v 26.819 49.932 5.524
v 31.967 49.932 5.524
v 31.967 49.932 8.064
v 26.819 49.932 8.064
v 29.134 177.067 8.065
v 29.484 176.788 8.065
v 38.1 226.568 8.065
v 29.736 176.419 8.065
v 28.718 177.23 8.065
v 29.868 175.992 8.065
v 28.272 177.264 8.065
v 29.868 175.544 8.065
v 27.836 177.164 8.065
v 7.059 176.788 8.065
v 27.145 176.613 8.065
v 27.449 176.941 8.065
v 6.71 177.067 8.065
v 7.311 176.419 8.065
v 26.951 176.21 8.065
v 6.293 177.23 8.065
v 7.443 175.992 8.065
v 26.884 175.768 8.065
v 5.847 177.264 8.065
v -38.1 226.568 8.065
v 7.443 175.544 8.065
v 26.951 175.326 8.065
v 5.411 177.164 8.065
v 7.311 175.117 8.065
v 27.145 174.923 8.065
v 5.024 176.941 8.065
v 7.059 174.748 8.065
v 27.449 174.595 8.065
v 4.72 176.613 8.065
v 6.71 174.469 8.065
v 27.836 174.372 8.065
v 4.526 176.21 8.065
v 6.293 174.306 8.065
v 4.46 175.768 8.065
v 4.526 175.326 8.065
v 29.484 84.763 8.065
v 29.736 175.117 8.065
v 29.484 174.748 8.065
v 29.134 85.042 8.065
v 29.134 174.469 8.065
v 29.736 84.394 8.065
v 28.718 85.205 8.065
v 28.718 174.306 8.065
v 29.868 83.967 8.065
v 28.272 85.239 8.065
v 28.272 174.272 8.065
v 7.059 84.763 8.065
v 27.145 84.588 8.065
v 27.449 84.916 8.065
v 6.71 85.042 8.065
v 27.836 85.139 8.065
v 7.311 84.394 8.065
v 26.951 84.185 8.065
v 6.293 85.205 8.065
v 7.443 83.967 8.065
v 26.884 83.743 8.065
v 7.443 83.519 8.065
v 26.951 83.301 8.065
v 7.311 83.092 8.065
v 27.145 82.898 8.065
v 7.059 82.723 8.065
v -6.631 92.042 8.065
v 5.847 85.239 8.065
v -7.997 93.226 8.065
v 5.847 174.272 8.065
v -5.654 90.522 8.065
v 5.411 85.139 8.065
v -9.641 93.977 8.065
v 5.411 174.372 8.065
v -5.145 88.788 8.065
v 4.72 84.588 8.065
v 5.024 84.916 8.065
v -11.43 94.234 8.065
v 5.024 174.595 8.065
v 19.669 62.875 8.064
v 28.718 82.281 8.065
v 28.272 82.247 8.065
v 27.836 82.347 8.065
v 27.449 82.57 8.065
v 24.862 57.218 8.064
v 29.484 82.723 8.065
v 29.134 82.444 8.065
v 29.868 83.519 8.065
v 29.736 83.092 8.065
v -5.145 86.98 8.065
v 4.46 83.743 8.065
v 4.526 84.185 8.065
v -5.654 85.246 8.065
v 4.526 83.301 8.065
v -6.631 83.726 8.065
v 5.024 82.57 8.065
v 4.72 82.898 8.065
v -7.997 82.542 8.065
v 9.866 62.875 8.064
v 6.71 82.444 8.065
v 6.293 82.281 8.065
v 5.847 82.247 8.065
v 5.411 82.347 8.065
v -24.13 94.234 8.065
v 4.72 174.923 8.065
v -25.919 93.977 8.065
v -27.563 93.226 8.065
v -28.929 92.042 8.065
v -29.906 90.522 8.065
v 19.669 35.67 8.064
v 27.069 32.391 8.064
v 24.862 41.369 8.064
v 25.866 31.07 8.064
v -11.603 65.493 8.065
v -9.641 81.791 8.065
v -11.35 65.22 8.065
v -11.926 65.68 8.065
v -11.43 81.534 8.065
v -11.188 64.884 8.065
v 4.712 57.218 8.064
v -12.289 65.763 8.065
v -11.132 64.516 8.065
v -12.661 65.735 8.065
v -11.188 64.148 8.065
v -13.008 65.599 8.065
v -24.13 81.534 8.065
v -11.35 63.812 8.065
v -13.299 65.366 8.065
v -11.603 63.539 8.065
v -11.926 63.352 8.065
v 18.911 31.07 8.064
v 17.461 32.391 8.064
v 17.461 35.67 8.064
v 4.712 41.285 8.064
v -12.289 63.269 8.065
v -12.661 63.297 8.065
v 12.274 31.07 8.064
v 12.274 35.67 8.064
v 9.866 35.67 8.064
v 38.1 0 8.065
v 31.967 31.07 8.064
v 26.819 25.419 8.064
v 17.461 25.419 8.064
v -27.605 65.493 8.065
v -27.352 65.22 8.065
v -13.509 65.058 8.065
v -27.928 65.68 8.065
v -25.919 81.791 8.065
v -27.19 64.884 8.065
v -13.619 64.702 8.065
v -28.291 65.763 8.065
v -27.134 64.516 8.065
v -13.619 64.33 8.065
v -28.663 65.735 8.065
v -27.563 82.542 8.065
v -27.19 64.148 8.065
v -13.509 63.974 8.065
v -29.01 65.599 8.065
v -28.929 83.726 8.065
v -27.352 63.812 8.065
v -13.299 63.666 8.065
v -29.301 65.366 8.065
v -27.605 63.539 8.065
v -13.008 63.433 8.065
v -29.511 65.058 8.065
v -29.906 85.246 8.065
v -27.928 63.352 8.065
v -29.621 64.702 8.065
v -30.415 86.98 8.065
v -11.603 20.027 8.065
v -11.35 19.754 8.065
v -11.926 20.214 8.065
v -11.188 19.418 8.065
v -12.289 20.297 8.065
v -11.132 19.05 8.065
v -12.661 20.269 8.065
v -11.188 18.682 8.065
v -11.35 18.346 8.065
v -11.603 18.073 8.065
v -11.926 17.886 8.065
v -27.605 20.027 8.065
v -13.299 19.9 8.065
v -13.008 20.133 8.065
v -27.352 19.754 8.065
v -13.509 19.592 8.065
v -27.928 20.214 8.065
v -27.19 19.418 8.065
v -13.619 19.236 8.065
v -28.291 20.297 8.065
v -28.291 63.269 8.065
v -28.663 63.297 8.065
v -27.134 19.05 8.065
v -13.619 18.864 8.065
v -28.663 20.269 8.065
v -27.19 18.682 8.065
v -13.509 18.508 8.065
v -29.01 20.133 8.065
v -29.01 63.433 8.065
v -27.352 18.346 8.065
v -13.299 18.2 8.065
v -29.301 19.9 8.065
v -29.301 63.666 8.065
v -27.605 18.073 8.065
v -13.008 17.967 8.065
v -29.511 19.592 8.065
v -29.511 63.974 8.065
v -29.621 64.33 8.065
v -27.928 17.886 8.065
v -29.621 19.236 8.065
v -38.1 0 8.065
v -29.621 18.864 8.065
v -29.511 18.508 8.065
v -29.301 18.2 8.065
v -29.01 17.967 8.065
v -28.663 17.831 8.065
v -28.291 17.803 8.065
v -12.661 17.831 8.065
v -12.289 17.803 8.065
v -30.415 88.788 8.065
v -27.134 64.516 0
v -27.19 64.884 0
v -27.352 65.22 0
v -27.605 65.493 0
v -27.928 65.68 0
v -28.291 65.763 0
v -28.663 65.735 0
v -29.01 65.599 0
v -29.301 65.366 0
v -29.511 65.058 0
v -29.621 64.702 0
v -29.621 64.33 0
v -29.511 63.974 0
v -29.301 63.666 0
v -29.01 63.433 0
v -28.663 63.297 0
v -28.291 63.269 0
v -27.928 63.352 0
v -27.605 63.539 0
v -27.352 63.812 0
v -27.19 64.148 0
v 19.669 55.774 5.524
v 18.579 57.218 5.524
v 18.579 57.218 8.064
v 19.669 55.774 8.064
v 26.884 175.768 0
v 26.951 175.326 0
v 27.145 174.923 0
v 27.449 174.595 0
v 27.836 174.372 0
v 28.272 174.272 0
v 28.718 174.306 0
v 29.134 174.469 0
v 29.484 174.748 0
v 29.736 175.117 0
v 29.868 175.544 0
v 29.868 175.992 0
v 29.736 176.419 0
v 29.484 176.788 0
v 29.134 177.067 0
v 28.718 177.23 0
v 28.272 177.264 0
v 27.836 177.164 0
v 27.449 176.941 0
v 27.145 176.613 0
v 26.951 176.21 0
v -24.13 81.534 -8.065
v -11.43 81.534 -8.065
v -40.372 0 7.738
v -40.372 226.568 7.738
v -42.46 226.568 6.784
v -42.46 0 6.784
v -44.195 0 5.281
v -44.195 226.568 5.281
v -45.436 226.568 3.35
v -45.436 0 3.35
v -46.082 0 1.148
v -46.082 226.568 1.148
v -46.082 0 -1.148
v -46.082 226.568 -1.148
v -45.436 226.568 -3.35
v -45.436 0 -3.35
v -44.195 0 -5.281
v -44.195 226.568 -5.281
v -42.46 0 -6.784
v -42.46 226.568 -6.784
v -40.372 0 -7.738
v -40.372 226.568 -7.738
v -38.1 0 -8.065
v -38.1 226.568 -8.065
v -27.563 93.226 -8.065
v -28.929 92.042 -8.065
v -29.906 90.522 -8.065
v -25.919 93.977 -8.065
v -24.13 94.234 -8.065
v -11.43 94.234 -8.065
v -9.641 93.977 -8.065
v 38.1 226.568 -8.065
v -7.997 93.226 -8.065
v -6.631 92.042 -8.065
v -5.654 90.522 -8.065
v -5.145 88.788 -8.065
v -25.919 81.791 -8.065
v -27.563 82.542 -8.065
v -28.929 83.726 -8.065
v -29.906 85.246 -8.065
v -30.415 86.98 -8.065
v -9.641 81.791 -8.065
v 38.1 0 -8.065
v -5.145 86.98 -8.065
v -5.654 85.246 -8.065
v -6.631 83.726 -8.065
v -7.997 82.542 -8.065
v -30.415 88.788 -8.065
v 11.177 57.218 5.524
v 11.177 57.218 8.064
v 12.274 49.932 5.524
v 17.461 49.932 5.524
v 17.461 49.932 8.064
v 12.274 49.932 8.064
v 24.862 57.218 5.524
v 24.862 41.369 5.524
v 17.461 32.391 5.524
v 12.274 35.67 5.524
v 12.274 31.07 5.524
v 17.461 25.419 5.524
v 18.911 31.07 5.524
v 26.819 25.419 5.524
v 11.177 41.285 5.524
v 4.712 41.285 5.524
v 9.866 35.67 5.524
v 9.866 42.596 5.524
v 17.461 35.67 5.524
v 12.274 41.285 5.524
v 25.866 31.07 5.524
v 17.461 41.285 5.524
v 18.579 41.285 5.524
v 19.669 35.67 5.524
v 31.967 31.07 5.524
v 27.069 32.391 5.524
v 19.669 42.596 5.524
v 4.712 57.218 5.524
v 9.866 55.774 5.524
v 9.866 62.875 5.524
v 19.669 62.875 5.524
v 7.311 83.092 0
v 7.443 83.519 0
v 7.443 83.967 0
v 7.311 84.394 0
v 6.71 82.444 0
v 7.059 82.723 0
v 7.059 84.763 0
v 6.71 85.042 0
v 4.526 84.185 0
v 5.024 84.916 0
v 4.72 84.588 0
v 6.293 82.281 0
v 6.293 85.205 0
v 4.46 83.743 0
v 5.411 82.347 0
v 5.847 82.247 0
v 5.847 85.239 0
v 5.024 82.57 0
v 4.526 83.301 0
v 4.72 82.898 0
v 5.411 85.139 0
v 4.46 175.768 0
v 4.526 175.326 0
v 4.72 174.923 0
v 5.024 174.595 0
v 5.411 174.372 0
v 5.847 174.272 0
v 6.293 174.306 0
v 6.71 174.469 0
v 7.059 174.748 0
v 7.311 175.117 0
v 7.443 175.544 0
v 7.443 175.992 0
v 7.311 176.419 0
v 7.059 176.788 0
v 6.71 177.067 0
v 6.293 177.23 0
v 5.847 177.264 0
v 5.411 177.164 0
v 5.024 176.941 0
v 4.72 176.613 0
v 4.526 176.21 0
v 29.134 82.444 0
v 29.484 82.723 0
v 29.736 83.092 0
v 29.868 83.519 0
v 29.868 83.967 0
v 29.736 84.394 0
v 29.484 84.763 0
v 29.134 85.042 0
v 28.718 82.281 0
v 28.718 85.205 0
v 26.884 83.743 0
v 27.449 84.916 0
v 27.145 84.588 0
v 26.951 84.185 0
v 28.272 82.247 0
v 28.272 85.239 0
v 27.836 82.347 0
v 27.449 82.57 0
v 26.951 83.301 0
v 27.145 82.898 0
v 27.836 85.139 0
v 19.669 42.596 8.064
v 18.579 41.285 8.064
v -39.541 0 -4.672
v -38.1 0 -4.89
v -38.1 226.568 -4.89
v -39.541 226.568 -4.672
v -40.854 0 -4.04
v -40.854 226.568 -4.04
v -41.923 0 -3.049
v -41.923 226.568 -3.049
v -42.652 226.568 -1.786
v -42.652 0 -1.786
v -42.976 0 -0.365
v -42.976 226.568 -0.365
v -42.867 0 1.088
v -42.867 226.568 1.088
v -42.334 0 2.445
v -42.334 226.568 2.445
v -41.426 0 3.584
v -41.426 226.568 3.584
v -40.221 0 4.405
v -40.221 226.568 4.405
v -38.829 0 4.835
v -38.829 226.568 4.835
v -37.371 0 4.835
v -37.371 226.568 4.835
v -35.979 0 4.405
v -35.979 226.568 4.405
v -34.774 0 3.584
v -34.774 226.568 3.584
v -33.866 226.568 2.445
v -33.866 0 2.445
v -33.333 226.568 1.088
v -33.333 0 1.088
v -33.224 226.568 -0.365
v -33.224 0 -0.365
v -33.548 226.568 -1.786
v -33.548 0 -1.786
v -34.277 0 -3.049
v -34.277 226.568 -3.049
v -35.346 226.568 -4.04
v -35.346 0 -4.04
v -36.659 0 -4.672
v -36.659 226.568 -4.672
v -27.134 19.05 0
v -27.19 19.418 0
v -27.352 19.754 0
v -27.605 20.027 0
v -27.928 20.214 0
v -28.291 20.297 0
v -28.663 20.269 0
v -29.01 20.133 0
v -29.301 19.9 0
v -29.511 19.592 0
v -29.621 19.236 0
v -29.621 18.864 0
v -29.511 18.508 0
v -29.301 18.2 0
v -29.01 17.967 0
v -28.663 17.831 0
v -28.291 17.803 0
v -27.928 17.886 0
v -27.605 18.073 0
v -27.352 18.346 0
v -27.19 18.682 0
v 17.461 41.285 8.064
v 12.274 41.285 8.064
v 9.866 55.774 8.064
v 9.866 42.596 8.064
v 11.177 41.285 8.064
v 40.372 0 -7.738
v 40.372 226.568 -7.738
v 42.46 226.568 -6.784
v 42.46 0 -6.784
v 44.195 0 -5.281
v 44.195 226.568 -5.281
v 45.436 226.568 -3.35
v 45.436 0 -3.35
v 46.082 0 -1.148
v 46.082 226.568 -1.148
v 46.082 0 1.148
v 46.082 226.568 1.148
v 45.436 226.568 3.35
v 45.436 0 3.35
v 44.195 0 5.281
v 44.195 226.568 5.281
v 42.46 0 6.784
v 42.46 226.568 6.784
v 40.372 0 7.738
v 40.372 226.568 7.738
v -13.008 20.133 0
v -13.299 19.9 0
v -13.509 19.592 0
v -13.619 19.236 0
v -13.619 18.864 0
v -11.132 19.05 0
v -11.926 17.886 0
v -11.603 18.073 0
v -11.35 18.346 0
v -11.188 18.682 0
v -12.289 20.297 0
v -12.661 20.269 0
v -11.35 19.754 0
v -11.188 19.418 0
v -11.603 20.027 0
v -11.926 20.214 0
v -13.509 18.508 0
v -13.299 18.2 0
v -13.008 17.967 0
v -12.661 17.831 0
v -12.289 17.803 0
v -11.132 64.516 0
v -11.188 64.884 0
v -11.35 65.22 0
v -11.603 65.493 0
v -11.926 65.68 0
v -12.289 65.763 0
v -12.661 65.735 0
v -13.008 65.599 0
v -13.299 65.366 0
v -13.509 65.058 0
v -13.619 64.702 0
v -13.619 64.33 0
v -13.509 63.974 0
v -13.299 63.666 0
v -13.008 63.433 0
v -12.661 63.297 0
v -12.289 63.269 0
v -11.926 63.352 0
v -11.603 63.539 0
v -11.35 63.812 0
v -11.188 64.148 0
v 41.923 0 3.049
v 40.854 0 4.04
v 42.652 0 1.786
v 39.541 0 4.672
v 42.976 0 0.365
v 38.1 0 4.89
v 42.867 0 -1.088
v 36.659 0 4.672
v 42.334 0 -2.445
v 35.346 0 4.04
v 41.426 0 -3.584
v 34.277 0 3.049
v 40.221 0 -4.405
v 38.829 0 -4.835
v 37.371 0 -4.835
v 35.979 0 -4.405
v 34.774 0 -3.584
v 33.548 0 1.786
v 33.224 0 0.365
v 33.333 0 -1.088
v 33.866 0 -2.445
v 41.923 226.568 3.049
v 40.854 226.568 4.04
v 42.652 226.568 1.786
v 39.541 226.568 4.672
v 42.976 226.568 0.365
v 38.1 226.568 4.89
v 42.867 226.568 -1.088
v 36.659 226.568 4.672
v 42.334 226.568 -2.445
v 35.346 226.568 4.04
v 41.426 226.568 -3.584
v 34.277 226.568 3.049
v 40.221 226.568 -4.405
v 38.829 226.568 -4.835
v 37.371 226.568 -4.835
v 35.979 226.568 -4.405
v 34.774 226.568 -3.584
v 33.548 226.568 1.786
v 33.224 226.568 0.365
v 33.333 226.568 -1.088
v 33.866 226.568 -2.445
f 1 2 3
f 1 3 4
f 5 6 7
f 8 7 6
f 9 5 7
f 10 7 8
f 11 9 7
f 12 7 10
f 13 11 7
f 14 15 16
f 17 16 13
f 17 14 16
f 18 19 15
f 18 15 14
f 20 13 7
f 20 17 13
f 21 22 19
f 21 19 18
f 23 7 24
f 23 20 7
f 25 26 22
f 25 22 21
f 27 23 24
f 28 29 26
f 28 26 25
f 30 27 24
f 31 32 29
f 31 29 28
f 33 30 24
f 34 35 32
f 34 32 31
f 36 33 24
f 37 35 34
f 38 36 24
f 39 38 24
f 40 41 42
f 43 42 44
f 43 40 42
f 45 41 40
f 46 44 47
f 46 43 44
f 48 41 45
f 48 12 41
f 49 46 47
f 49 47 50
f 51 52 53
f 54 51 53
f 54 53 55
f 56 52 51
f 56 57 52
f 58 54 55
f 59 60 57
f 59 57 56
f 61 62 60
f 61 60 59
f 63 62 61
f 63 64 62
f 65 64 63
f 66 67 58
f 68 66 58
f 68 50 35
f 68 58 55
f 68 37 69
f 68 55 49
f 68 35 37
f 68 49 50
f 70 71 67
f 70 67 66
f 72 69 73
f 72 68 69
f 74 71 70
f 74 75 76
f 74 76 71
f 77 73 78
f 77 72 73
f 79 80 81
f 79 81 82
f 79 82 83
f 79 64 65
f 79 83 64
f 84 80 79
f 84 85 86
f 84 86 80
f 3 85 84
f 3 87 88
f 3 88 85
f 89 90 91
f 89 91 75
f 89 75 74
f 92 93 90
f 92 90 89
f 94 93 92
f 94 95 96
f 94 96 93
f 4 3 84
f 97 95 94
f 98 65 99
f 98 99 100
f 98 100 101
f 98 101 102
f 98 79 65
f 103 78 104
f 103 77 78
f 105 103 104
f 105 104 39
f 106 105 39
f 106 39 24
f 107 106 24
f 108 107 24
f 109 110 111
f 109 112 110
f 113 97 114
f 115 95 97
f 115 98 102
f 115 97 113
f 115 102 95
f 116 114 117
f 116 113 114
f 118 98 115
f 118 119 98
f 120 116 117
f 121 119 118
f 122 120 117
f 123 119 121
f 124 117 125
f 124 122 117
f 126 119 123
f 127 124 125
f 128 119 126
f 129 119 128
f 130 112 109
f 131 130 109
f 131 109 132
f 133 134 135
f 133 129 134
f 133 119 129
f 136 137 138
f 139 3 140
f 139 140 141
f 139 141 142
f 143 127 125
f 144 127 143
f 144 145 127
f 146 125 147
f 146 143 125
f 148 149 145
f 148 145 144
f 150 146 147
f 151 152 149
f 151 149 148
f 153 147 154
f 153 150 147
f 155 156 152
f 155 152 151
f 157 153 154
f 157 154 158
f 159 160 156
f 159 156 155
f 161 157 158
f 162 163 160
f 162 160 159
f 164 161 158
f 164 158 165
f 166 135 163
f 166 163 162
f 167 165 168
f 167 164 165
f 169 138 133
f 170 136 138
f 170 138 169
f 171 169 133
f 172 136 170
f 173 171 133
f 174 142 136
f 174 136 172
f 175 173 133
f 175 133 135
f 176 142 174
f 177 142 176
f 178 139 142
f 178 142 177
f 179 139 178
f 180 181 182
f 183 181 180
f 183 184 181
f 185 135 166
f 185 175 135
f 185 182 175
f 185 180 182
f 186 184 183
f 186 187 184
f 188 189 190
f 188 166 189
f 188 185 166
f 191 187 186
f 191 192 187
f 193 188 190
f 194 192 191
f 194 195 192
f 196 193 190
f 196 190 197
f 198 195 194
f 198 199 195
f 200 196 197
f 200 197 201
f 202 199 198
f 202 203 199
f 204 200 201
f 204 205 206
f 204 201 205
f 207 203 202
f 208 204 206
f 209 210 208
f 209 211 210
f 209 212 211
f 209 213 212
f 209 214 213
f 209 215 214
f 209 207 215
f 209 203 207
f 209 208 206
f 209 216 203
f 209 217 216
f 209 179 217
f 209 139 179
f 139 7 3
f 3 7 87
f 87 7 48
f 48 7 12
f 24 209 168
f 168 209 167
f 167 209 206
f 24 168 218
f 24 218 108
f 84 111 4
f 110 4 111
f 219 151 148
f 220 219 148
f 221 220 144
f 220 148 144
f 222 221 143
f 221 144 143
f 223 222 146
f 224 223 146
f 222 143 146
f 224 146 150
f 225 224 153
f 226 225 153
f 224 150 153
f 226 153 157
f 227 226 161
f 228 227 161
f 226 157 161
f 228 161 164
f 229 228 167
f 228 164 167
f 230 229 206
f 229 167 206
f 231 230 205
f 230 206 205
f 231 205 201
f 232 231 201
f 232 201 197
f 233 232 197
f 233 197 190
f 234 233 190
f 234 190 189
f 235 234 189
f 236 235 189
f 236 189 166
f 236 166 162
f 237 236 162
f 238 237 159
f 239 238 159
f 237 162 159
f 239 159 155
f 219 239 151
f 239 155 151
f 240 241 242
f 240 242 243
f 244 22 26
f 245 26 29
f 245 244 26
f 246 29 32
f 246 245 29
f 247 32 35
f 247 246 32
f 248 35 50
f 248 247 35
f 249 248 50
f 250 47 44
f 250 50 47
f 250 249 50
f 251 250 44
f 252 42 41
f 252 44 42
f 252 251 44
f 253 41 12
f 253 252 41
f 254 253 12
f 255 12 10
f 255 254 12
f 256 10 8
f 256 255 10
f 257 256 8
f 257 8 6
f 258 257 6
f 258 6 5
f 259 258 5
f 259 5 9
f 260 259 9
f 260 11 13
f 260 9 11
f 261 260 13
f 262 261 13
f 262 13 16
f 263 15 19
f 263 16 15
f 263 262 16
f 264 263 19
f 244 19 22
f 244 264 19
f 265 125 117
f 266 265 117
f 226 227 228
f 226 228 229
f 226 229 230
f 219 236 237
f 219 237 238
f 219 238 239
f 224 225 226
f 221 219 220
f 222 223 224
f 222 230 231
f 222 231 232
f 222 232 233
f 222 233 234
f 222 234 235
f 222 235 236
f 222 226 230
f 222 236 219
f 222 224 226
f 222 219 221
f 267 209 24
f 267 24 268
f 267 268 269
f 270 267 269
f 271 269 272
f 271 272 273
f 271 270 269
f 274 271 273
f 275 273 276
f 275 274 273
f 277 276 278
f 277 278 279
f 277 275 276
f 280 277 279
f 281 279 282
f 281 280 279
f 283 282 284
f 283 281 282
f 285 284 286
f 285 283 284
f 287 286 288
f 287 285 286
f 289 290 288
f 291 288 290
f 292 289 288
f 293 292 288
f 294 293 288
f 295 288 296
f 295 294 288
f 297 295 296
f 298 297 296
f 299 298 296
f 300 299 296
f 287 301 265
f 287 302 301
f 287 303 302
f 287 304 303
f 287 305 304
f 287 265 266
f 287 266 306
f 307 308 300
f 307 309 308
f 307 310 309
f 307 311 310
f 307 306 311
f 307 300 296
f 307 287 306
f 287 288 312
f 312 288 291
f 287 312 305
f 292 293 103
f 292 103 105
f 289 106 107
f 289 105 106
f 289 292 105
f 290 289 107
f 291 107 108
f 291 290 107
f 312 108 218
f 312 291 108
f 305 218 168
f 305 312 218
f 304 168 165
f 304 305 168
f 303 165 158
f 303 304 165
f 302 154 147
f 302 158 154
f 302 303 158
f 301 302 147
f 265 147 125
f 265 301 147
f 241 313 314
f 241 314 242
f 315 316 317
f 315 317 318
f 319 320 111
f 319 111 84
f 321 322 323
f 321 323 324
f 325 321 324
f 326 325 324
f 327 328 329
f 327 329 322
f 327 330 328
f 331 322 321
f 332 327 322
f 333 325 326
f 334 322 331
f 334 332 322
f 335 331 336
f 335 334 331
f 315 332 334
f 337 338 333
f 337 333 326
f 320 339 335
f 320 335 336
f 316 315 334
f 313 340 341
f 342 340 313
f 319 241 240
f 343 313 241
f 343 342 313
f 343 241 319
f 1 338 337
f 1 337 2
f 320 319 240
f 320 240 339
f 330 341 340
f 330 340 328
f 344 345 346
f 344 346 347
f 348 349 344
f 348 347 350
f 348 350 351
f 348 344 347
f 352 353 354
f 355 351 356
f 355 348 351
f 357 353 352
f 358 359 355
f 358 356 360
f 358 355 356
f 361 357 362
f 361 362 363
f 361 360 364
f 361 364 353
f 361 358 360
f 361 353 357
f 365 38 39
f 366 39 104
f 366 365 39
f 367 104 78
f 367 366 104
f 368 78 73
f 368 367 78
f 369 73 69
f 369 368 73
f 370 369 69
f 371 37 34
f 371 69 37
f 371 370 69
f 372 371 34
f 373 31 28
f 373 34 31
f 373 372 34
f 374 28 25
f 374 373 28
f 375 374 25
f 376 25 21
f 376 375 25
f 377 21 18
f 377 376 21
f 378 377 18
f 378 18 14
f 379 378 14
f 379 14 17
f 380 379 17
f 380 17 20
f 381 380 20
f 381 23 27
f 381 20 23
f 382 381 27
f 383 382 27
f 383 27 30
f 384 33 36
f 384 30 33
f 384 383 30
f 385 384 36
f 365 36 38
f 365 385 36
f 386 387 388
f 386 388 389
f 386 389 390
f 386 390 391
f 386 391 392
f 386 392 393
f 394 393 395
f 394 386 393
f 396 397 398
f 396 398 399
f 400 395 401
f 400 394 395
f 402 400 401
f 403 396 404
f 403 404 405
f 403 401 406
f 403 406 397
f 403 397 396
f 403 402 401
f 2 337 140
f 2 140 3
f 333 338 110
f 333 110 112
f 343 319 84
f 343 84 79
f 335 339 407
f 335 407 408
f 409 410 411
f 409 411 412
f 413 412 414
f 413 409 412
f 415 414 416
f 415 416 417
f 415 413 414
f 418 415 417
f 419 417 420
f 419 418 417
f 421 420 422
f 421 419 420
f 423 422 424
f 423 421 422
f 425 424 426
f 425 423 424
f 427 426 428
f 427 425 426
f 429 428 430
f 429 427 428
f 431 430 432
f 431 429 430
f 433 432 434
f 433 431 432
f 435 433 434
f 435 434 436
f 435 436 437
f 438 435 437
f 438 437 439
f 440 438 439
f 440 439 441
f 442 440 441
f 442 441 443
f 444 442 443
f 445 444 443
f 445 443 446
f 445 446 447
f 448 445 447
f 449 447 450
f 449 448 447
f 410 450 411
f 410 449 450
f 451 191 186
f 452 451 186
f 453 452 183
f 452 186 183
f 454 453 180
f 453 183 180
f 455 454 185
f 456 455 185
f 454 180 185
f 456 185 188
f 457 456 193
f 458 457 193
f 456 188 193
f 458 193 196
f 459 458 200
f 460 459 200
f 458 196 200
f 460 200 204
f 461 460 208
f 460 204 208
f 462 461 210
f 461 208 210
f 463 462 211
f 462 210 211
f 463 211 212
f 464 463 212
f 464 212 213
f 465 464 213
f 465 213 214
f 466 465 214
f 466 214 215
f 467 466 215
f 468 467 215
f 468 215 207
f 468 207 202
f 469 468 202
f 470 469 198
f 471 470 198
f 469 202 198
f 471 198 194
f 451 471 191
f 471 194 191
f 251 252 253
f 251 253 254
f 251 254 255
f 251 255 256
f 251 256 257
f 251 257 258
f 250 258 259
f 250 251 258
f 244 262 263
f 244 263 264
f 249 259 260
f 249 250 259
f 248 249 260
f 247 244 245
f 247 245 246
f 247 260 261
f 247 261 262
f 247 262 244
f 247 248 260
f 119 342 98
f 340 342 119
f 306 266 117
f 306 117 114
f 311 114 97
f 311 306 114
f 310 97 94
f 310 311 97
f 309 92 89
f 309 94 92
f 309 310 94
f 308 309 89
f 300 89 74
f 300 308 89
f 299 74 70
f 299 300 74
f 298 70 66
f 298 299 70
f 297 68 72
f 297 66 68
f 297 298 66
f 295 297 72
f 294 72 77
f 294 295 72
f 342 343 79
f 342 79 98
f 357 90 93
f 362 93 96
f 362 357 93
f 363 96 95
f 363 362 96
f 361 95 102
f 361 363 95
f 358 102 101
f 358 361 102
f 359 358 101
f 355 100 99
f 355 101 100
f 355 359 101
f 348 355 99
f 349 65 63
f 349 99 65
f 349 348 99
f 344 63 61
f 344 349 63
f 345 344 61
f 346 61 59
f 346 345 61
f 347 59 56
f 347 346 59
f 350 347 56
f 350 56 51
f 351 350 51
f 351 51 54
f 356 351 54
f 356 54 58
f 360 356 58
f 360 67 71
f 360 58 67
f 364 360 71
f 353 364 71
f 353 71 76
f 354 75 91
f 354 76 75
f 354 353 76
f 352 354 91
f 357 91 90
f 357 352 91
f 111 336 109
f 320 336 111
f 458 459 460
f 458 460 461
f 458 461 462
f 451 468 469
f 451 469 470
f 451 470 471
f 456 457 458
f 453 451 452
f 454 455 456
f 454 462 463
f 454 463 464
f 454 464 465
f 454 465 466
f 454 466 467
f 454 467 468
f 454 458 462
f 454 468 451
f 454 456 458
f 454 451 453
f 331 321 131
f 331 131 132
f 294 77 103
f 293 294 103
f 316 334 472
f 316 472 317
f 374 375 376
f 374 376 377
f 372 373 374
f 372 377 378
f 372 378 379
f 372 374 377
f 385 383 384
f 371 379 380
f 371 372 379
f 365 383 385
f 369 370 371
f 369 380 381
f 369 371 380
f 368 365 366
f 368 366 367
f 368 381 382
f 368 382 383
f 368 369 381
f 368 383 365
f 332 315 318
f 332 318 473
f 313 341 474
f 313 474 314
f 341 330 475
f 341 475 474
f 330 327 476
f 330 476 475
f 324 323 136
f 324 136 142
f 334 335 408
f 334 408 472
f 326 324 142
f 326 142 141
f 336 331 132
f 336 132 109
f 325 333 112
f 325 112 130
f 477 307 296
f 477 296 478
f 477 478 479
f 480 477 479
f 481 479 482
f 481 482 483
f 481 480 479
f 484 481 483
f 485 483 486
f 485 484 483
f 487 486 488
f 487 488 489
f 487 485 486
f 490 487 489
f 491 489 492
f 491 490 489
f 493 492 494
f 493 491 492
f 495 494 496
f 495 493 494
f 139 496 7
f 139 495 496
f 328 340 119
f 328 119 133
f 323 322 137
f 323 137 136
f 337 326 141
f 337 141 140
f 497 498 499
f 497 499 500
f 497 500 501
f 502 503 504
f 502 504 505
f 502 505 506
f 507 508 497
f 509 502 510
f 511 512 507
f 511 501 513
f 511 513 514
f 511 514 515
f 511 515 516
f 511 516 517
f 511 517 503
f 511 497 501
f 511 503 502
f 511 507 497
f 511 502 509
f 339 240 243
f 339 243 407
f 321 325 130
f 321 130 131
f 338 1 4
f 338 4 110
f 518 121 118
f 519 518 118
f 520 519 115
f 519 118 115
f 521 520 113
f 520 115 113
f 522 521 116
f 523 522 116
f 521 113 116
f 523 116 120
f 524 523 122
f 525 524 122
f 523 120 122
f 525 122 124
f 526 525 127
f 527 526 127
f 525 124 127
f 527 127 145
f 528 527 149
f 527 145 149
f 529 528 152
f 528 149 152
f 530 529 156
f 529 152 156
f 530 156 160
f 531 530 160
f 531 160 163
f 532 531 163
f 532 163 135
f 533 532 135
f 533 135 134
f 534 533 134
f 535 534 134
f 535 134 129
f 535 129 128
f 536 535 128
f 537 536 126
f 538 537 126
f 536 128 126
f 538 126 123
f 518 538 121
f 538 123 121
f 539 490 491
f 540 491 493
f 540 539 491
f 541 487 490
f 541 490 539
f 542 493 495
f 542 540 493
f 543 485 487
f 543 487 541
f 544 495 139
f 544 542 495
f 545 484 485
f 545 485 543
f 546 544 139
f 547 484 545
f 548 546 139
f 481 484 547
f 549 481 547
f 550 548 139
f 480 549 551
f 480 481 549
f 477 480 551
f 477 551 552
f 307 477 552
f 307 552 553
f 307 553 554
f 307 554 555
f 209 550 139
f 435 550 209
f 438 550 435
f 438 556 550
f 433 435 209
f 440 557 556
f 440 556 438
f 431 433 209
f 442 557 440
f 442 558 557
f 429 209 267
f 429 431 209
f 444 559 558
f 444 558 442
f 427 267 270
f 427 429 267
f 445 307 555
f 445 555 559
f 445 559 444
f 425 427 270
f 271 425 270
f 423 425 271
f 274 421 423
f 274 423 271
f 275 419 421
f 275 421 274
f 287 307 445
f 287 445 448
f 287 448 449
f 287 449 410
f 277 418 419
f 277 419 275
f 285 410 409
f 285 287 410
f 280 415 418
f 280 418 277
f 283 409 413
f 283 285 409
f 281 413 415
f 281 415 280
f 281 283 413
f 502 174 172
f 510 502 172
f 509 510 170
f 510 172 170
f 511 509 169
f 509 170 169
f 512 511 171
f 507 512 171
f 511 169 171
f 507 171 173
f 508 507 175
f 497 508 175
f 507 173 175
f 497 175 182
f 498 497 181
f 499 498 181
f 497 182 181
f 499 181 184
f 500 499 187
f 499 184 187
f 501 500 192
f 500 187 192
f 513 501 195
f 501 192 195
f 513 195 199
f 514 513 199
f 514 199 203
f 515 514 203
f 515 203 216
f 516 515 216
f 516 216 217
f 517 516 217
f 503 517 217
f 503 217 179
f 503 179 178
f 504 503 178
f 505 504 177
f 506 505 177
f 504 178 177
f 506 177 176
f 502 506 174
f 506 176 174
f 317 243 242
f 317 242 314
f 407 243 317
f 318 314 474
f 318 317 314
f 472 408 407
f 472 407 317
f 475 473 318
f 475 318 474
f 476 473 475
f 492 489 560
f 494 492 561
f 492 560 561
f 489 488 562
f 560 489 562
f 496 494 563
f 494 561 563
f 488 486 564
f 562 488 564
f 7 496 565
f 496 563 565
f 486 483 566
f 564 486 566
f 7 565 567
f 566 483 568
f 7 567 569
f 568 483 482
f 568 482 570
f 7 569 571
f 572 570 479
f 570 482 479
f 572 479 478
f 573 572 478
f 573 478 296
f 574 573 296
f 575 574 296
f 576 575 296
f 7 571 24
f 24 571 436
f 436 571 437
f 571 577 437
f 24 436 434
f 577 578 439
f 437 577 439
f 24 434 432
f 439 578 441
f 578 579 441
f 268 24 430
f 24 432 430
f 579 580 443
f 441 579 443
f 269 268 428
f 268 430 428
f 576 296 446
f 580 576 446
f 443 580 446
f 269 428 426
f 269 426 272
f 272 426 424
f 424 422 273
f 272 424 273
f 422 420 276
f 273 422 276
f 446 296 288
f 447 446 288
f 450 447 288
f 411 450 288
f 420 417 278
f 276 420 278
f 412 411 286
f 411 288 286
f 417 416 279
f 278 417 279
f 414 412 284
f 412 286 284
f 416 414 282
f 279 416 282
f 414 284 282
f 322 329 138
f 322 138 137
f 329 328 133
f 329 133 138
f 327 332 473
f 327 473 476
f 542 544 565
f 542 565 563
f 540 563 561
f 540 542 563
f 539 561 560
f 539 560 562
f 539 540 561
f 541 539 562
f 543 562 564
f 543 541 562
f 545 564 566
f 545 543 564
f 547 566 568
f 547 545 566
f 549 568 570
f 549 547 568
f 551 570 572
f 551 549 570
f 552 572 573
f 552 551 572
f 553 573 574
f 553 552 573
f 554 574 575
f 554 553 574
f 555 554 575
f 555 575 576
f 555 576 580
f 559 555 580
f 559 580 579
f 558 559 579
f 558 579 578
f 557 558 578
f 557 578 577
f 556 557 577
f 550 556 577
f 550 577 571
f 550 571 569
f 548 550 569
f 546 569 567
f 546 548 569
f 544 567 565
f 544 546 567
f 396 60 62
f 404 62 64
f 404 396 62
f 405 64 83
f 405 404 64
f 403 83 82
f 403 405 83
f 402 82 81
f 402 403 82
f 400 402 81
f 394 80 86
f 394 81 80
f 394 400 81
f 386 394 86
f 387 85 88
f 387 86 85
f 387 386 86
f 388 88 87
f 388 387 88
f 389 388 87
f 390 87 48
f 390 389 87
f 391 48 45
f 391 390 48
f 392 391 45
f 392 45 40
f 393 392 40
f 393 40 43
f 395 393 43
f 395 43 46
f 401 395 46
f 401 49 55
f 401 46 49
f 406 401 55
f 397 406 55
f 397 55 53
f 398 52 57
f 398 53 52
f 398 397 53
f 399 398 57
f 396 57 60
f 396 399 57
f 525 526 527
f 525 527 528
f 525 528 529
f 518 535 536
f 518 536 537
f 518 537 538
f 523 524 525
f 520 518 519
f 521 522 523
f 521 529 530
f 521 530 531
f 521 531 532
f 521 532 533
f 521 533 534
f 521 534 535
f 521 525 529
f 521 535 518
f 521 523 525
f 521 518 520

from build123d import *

# Parameters (mm, degrees)
SKETCH1_R               = 4.8895
BOSS_EXTRUDE1_DEPTH     = 226.568
CUT_EXTRUDE2_DEPTH      = 232.785168476
CUT_EXTRUDE2_DEPTH_BACK = 232.785168476
CUT_EXTRUDE3_START      = 5.5245
CUT_EXTRUDE3_DEPTH      = 2.54
CUT_EXTRUDE4_DEPTH      = 232.785168476
CUT_EXTRUDE4_DEPTH_BACK = 8.0645
SKETCH6_R               = 1.5
SKETCH7_R               = 1.25
CUT_EXTRUDE5_DEPTH      = 8.0645


# Read off the part's stored shape, not the designer's step: Cut-Extrude3
with BuildPart() as part:
    # Sketch1 → Boss-Extrude1 (new body)
    with BuildSketch(Plane(origin=(0, 0, 0), x_dir=(1, 0, 0), z_dir=(0, 1, 0))):
        with BuildLine():
            Line((-38.1, 8.0645), (38.1, 8.0645))
            ThreePointArc((38.1, 8.0645), (46.1645, 0), (38.1, -8.0645))
            Line((38.1, -8.0645), (-38.1, -8.0645))
            ThreePointArc((-38.1, -8.0645), (-46.1645, 0), (-38.1, 8.0645))
        make_face()
        with Locations(Location((38.1, 0, 0), (0, 0, 270))):
            Circle(SKETCH1_R, mode=Mode.SUBTRACT)
        with Locations(Location((-38.1, 0, 0), (0, 0, 90))):
            Circle(SKETCH1_R, mode=Mode.SUBTRACT)
    extrude(amount=BOSS_EXTRUDE1_DEPTH)

    # Sketch2 → Cut-Extrude2 (cut, two sides: drawn at the far end of the back side and taken through both)
    with BuildSketch(Plane.XY.offset(8.0645).offset(-CUT_EXTRUDE2_DEPTH_BACK)):
        with BuildLine():
            Line((-24.13, 81.534), (-11.43, 81.534))
            ThreePointArc((-11.43, 81.534), (-5.08, 87.884), (-11.43, 94.234))
            Line((-11.43, 94.234), (-24.13, 94.234))
            ThreePointArc((-24.13, 94.234), (-30.48, 87.884), (-24.13, 81.534))
        make_face()
    extrude(amount=CUT_EXTRUDE2_DEPTH + CUT_EXTRUDE2_DEPTH_BACK, mode=Mode.SUBTRACT)

    # Cut-Extrude3 outline → Cut-Extrude3 (cut)
    with BuildSketch(Plane.XY.offset(CUT_EXTRUDE3_START)):
        Polygon((4.712362594, 41.284608988), (9.865946199, 35.669510433), (12.274110435, 35.669510433), (12.274110435, 31.069950753), (17.460700987, 25.418889406), (26.818871611, 25.418889406), (31.966756262, 31.069950753), (31.966756262, 49.931639685), (26.818871611, 49.931639685), (27.068707369, 32.39069939), (25.865559638, 31.069950753), (18.910545355, 31.069950753), (17.460700987, 32.39069939), (17.460700987, 35.669510433), (19.669379675, 35.669510433), (24.861712029, 41.369363995), (24.861712029, 57.217602301), (19.669379675, 62.874919643), (9.865946199, 62.874919643), (4.712362594, 57.217602301), align=None)
        Polygon((17.460700987, 41.284608988), (17.460700987, 49.931639685), (12.274110435, 49.931639685), (12.274110435, 41.284608988), (11.176923497, 41.284608988), (9.865946199, 42.595586286), (9.865946199, 55.774170995), (11.176923497, 57.217602301), (18.57945551, 57.217602301), (19.669379675, 55.774170995), (19.669379675, 42.595586286), (18.57945551, 41.284608988), align=None, mode=Mode.SUBTRACT)
    extrude(amount=CUT_EXTRUDE3_DEPTH, mode=Mode.SUBTRACT)

    # Sketch6 → Cut-Extrude4 (cut, two sides: drawn at the far end of the back side and taken through both)
    with BuildSketch(Plane.XY.offset(8.0645).offset(-CUT_EXTRUDE4_DEPTH_BACK)):
        with Locations(Location((28.3845, 175.768, 0), (0, 0, 180))):
            Circle(SKETCH6_R)
        with Locations(Location((5.9595, 175.768, 0), (0, 0, 180))):
            Circle(SKETCH6_R)
        with Locations(Location((5.9595, 83.743, 0), (0, 0, 180))):
            Circle(SKETCH6_R)
        with Locations(Location((28.3845, 83.743, 0), (0, 0, 180))):
            Circle(SKETCH6_R)
    extrude(amount=CUT_EXTRUDE4_DEPTH + CUT_EXTRUDE4_DEPTH_BACK, mode=Mode.SUBTRACT)

    # Sketch7 → Cut-Extrude5 (cut)
    with BuildSketch(Plane.XY.offset(8.0645)):
        with Locations((-12.3825, 64.516)):
            Circle(SKETCH7_R)
        with Locations((-28.3845, 64.516)):
            Circle(SKETCH7_R)
        with Locations((-12.3825, 19.05)):
            Circle(SKETCH7_R)
        with Locations((-28.3845, 19.05)):
            Circle(SKETCH7_R)
    extrude(amount=-CUT_EXTRUDE5_DEPTH, mode=Mode.SUBTRACT)


solid = part.part
